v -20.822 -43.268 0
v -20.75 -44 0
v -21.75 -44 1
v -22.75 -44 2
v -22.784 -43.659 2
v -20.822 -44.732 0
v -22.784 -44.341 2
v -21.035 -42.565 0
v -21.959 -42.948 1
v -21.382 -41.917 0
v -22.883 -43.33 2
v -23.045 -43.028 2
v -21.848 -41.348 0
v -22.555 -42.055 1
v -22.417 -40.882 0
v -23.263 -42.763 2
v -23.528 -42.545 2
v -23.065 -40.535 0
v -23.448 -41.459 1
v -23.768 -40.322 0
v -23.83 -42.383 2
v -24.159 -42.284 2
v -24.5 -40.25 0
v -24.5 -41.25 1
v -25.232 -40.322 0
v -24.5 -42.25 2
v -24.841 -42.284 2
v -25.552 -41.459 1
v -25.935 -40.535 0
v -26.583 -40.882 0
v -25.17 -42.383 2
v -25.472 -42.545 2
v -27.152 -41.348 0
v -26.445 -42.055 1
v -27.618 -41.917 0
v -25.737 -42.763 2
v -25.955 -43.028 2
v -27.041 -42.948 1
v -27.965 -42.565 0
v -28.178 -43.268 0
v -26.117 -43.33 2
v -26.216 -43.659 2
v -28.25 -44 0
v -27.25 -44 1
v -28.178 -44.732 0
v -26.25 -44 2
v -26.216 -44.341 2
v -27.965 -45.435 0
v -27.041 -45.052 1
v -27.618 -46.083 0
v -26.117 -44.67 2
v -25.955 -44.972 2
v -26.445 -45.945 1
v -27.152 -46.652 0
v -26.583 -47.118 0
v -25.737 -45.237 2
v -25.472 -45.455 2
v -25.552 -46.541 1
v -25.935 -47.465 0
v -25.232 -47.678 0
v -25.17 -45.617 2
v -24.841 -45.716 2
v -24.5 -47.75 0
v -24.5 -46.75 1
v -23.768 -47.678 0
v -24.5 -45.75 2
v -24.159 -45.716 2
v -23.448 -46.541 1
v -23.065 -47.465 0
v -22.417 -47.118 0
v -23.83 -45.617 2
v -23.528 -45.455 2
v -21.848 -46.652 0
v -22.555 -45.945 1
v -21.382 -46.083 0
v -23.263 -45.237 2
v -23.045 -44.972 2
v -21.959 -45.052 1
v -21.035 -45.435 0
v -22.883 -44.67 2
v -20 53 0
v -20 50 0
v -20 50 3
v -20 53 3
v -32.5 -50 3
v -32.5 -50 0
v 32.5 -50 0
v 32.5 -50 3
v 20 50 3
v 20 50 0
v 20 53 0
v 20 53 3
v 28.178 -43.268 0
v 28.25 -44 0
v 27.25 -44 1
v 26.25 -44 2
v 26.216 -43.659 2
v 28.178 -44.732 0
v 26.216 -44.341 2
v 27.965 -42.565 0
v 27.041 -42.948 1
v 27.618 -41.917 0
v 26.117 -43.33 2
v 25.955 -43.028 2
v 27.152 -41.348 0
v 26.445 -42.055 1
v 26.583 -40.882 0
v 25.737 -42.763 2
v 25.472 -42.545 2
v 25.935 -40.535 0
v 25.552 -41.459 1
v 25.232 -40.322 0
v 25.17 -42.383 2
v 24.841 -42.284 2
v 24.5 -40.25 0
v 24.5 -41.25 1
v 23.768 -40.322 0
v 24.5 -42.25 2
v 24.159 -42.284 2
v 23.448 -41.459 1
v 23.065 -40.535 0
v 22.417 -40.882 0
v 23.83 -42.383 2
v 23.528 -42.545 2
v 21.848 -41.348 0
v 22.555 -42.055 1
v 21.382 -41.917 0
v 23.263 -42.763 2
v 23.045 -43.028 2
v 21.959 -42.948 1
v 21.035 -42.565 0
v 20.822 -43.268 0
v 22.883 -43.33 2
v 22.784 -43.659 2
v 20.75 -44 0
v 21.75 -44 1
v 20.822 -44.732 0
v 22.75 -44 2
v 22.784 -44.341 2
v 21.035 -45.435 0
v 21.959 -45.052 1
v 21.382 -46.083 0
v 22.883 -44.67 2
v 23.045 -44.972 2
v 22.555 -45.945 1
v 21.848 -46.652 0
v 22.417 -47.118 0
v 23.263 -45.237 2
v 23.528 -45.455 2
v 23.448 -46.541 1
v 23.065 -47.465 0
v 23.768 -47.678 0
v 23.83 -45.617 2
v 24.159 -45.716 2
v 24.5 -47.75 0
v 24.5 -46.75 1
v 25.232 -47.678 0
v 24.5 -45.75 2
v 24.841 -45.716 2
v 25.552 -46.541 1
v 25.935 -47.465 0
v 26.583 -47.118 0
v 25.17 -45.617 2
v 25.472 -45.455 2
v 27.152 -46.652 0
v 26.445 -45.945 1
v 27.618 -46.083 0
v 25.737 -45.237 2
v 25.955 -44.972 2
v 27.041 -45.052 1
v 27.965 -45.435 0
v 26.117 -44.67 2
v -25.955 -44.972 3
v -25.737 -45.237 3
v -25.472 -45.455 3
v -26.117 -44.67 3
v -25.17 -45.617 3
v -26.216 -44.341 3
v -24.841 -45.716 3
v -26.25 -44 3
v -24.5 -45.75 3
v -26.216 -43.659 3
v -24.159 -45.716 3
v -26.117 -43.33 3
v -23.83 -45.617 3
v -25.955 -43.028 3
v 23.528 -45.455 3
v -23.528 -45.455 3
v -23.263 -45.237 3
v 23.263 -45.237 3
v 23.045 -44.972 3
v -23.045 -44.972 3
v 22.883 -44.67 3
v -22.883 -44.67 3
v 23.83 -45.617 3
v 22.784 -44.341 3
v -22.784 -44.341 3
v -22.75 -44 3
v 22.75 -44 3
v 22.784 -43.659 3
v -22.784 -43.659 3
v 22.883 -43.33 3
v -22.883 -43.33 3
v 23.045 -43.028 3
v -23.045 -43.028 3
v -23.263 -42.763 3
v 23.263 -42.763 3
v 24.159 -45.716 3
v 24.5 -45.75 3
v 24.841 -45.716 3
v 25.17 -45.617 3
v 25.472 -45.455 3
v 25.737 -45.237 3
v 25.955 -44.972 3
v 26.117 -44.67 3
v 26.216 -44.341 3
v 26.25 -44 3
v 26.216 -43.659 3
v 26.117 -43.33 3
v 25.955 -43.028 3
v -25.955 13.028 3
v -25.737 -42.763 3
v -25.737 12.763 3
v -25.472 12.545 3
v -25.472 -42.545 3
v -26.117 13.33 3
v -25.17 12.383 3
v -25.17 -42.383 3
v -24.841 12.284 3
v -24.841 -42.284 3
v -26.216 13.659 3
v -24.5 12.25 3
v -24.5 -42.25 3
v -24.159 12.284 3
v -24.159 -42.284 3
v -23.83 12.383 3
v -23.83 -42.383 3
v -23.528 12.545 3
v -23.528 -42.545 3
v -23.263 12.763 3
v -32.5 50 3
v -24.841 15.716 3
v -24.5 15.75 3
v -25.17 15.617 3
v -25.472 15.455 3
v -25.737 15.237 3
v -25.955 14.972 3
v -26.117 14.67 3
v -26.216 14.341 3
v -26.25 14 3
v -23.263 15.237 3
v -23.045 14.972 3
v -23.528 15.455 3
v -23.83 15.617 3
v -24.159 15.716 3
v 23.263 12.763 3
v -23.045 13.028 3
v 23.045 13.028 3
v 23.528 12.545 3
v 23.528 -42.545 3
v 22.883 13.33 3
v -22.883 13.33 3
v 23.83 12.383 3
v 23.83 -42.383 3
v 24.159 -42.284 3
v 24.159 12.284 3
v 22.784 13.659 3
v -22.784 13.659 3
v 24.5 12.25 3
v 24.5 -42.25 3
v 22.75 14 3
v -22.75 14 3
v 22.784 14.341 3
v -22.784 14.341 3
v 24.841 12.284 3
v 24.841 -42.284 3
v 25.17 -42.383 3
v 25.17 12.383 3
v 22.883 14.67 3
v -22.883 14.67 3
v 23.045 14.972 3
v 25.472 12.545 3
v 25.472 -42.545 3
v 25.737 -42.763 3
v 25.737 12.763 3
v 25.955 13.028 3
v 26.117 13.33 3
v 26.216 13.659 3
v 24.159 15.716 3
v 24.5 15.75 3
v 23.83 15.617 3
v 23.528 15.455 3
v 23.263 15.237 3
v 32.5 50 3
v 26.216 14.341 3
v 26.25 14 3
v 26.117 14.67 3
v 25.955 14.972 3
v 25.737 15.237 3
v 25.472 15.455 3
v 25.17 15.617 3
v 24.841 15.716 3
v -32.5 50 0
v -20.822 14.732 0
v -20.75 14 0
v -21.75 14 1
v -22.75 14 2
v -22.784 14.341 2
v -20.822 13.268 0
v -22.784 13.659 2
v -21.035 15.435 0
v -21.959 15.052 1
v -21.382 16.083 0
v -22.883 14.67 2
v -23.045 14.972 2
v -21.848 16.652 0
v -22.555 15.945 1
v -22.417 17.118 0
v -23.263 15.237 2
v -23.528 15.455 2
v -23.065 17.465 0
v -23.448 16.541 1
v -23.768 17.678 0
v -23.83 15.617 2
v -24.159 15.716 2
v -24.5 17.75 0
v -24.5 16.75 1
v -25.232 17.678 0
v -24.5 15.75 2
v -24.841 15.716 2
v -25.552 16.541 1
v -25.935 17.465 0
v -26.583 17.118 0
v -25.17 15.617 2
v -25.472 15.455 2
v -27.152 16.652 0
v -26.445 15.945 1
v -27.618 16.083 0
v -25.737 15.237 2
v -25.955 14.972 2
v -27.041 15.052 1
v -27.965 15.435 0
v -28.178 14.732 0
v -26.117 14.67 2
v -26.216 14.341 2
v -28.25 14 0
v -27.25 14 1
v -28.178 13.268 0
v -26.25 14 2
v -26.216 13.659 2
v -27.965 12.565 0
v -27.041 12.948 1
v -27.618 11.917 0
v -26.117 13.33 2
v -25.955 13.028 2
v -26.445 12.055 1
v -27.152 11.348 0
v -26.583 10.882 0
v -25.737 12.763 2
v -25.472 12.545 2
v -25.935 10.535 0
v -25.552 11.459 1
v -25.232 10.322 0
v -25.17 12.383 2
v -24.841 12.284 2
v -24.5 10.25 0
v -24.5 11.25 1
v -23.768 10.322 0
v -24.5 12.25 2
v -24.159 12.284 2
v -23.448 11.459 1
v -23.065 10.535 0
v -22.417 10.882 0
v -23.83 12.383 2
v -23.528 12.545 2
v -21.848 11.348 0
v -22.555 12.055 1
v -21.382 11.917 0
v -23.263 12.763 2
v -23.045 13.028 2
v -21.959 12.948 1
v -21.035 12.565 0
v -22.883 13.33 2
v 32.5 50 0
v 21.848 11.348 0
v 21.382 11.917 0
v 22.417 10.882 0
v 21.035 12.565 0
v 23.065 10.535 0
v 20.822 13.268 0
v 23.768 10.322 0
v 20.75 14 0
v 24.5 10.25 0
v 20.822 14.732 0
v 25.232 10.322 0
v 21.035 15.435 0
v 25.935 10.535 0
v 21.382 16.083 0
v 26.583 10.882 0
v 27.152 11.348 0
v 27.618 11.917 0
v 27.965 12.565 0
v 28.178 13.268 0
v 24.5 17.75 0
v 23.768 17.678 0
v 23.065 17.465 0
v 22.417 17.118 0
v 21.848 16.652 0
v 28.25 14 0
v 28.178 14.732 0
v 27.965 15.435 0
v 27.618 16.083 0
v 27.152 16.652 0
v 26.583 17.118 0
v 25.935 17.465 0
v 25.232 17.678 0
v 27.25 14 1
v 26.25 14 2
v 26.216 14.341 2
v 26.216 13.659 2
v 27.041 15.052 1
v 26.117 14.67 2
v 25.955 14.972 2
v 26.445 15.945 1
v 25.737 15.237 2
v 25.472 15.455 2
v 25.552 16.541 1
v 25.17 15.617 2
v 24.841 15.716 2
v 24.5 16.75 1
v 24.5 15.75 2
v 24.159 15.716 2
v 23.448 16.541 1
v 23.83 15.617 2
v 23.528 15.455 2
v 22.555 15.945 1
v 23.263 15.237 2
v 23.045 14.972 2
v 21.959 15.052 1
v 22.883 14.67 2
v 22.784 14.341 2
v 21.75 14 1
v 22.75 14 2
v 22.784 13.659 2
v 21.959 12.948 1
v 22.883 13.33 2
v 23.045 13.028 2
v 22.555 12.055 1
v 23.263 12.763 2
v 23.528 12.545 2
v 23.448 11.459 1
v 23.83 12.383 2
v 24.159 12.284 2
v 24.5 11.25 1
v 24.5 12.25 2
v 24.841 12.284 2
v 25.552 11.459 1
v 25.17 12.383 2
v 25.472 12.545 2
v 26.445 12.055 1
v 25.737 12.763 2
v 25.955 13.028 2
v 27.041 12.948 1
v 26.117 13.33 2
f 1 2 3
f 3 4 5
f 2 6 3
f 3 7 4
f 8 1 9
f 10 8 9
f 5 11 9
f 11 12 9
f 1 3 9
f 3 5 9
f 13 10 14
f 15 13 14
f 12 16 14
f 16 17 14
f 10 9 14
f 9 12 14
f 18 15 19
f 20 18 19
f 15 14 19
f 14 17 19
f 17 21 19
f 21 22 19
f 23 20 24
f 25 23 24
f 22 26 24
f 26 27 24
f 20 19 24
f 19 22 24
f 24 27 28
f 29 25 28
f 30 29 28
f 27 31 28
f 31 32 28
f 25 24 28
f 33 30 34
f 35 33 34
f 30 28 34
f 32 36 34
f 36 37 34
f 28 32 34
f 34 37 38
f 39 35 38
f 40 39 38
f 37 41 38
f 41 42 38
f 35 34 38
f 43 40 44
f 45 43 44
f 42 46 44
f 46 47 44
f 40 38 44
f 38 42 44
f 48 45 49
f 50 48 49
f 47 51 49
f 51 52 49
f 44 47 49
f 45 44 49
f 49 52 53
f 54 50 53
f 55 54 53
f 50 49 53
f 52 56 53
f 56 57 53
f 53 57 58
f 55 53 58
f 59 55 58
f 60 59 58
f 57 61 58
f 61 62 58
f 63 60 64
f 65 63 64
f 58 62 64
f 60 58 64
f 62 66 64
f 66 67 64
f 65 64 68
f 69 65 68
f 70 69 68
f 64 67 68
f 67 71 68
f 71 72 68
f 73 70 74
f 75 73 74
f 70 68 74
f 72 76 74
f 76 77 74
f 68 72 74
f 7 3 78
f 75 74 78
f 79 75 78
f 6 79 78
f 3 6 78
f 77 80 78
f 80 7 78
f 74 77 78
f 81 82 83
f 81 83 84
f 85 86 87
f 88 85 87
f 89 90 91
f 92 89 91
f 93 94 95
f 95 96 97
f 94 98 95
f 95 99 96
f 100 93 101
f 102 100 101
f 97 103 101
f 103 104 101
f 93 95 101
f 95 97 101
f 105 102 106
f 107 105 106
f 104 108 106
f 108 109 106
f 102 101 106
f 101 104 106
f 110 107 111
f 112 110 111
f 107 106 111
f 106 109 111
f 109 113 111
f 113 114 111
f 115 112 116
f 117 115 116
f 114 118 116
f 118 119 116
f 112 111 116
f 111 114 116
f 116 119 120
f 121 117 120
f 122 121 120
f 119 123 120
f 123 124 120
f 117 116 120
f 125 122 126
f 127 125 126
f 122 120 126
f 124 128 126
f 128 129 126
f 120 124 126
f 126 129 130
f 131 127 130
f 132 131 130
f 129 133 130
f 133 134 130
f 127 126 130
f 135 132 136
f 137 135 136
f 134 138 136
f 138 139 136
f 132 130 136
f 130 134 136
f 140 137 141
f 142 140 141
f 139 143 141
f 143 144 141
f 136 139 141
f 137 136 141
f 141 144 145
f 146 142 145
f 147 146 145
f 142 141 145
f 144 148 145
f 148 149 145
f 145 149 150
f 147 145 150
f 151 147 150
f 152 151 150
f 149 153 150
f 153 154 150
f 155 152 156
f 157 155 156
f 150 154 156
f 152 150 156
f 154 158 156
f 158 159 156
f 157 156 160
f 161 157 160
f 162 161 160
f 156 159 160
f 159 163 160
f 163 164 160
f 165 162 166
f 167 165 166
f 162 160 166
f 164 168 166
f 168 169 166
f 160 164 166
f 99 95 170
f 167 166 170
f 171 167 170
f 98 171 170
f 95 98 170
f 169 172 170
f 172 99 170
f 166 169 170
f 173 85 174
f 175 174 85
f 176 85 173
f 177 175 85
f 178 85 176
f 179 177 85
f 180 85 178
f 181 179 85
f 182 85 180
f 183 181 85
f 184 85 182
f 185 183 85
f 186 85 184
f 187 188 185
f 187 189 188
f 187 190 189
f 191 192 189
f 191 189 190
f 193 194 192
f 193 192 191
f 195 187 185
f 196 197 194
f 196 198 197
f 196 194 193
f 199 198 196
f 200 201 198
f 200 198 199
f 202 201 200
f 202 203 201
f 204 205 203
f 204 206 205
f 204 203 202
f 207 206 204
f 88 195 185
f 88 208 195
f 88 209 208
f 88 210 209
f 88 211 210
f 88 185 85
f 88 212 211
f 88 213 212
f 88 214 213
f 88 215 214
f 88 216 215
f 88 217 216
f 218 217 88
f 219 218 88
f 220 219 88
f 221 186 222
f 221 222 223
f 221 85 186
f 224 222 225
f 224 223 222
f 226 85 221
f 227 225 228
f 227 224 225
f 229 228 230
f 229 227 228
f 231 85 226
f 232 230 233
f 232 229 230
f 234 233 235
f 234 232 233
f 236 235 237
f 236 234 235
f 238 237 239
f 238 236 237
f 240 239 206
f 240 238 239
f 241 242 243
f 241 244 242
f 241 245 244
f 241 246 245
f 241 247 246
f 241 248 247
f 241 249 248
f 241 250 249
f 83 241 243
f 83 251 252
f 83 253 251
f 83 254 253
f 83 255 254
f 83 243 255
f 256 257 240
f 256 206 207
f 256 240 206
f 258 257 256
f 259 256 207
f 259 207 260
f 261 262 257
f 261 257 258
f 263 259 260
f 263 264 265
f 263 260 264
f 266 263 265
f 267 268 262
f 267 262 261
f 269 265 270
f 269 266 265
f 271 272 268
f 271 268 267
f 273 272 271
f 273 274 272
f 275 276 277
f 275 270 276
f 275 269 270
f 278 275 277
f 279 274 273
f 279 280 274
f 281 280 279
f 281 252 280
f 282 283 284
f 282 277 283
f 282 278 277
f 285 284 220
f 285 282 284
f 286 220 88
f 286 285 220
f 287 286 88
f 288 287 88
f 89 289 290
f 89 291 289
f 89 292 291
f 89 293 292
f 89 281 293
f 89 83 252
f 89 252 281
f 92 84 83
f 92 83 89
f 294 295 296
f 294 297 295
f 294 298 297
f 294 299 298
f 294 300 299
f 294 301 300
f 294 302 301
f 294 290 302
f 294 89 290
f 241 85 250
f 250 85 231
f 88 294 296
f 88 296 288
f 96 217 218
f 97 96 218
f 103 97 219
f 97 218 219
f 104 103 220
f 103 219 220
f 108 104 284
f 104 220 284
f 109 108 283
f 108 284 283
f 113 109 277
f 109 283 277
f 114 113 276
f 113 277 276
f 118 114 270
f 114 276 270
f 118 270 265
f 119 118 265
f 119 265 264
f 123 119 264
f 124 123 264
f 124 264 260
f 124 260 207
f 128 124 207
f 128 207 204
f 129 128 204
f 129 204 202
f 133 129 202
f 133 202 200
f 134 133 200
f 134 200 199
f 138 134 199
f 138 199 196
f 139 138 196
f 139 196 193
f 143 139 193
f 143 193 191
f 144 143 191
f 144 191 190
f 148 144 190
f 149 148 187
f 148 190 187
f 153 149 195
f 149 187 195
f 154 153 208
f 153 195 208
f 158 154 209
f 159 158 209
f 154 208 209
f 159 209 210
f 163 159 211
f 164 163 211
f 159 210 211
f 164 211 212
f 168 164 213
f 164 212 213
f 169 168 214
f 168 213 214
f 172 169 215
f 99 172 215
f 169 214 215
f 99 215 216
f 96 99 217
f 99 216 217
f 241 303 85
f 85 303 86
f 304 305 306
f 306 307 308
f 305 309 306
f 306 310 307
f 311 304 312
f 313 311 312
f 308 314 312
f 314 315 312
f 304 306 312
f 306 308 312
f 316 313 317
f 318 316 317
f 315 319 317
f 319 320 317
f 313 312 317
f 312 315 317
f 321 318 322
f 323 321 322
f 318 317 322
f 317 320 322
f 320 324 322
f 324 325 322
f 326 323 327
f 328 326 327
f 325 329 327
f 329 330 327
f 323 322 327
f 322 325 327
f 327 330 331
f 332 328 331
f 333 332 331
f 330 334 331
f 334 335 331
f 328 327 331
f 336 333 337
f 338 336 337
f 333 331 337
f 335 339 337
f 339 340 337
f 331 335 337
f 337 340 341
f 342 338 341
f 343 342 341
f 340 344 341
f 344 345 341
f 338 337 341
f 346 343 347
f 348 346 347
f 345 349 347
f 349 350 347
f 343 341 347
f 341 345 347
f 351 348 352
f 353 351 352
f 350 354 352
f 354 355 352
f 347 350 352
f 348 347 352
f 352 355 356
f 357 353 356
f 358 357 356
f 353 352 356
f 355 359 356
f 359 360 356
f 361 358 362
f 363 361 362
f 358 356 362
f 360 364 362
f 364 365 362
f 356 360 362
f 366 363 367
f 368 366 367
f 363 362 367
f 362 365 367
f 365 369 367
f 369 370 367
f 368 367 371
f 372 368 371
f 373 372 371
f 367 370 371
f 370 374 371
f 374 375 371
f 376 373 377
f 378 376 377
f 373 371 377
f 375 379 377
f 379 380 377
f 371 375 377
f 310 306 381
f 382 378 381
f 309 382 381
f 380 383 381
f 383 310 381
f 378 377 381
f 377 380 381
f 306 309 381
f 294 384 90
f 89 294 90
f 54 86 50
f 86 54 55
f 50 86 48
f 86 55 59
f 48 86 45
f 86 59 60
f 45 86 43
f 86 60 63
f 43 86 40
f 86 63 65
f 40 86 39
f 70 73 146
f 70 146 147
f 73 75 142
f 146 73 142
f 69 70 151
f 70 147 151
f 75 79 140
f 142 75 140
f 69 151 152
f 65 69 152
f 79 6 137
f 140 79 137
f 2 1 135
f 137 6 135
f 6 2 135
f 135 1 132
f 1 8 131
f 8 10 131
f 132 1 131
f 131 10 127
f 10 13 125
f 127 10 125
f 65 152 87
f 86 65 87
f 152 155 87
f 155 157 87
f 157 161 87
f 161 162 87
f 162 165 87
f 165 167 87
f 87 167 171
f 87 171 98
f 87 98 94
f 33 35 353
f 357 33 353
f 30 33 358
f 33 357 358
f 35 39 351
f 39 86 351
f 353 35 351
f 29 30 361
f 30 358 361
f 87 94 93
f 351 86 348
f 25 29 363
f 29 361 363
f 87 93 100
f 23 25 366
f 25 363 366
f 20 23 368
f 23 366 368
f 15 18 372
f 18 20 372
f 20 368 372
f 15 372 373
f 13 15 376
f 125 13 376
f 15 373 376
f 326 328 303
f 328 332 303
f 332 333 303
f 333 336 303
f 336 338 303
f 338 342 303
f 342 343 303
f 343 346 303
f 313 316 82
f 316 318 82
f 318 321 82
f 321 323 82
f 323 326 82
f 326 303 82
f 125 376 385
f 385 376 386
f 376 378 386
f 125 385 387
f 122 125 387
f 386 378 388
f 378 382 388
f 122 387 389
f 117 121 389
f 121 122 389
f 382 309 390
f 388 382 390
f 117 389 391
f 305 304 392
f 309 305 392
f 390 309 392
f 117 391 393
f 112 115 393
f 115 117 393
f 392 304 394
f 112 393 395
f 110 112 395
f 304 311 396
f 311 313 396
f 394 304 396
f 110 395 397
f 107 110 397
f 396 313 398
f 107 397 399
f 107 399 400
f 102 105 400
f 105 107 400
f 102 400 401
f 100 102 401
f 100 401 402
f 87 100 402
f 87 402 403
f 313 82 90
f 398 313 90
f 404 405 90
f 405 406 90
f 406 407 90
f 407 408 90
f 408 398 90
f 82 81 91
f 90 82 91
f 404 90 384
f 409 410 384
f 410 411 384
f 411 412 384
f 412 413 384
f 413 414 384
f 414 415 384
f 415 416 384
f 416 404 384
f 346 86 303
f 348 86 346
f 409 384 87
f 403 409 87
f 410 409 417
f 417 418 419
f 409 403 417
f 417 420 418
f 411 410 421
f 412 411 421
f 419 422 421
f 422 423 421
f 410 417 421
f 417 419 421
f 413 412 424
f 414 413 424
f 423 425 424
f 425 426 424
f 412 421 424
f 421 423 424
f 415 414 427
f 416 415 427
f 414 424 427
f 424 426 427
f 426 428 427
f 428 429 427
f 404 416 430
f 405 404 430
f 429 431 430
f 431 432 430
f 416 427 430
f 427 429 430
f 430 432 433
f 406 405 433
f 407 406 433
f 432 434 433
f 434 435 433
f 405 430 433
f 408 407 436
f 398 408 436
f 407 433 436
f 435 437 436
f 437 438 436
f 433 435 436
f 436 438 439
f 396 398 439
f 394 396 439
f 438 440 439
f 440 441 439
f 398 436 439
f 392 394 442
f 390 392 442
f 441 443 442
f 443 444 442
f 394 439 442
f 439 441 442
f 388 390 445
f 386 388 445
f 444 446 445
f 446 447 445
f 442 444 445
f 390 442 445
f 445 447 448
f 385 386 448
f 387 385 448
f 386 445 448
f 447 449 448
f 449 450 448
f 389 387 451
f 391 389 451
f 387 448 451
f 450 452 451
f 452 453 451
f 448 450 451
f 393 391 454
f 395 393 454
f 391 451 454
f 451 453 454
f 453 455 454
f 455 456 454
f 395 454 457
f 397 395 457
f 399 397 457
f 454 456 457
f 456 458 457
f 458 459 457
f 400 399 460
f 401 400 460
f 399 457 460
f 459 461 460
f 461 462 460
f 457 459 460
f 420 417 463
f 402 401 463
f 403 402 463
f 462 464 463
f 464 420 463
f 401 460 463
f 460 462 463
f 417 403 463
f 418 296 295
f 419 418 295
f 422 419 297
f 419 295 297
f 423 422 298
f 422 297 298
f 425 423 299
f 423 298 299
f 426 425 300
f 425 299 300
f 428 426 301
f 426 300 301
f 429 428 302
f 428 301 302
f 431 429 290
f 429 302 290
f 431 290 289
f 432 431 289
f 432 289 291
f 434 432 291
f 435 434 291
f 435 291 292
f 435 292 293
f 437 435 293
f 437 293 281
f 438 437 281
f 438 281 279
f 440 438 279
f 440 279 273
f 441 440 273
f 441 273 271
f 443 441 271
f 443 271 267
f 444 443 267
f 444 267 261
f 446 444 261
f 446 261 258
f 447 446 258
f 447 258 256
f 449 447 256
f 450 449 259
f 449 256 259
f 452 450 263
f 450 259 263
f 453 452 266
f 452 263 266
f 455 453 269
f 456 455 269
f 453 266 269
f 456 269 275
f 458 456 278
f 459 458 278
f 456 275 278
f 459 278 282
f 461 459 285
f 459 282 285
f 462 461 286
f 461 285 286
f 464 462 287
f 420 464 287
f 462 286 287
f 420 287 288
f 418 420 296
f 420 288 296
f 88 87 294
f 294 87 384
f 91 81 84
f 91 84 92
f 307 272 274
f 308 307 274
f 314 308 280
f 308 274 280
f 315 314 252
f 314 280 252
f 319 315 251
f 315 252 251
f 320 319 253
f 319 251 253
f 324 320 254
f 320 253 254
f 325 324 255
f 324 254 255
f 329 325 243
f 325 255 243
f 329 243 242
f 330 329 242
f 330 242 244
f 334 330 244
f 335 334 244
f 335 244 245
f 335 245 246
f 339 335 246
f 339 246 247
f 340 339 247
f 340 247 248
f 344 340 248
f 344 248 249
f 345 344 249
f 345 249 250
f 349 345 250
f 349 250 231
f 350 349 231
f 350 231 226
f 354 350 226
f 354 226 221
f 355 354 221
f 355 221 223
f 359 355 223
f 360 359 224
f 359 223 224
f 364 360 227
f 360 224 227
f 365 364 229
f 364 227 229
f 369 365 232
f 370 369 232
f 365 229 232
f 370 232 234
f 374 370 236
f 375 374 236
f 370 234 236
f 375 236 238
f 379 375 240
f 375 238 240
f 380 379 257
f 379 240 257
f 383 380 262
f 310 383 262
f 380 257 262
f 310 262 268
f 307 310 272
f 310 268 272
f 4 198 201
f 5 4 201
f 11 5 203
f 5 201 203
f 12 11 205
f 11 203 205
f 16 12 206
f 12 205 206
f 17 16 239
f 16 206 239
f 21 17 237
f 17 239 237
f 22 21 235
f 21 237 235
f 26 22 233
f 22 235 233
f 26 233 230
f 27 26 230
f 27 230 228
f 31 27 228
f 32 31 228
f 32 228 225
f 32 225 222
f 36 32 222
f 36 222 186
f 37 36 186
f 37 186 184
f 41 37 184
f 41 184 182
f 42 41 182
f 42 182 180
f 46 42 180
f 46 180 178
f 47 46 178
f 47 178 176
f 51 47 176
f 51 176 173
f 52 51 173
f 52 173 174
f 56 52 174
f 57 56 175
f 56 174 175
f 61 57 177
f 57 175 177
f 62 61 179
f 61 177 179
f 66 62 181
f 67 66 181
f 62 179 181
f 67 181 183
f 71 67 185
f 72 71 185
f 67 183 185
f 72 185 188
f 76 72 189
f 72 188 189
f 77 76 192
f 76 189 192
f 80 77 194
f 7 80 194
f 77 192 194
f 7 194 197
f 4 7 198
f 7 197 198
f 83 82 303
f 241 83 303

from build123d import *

# Parameters (mm, degrees)
SKETCH_1_W          = 40
SKETCH_1_H          = 3
EXTRUDE_1_DEPTH     = 3
SKETCH_2_R          = 1.75
CUT_EXTRUDE_1_DEPTH = 10
CHAMFER_1_SIZE      = 2


with BuildPart() as part:
    # Эскиз1 → Бобышка-Вытянуть1 (new body)
    with BuildSketch(Plane.XY):
        Polygon((-32.5, 50), (-32.5, -50), (32.5, -50), (32.5, 50), (20, 50), (20, 47), (-20, 47), (-20, 50), align=None)
        with Locations((0, 48.5)):
            Rectangle(SKETCH_1_W, SKETCH_1_H)
        with Locations((0, 51.5)):
            Rectangle(SKETCH_1_W, SKETCH_1_H)
    extrude(amount=EXTRUDE_1_DEPTH)

    # Эскиз2 → Вырез-Вытянуть1 (cut)
    with BuildSketch(Plane.XY.offset(3)):
        with Locations((-24.5, 14)):
            Circle(SKETCH_2_R)
        with Locations((24.5, 14)):
            Circle(SKETCH_2_R)
        with Locations((24.5, -44)):
            Circle(SKETCH_2_R)
        with Locations((-24.5, -44)):
            Circle(SKETCH_2_R)
    extrude(amount=-CUT_EXTRUDE_1_DEPTH, mode=Mode.SUBTRACT)

    # Фаска1
    chamfer_1_edges = [part.edges().sort_by_distance(p)[0] for p in [
        (-26.25, -44, 0),
        (22.75, -44, 0),
        (22.75, 14, 0),
        (-26.25, 14, 0),
    ]]
    chamfer(chamfer_1_edges, length=CHAMFER_1_SIZE)


solid = part.part
